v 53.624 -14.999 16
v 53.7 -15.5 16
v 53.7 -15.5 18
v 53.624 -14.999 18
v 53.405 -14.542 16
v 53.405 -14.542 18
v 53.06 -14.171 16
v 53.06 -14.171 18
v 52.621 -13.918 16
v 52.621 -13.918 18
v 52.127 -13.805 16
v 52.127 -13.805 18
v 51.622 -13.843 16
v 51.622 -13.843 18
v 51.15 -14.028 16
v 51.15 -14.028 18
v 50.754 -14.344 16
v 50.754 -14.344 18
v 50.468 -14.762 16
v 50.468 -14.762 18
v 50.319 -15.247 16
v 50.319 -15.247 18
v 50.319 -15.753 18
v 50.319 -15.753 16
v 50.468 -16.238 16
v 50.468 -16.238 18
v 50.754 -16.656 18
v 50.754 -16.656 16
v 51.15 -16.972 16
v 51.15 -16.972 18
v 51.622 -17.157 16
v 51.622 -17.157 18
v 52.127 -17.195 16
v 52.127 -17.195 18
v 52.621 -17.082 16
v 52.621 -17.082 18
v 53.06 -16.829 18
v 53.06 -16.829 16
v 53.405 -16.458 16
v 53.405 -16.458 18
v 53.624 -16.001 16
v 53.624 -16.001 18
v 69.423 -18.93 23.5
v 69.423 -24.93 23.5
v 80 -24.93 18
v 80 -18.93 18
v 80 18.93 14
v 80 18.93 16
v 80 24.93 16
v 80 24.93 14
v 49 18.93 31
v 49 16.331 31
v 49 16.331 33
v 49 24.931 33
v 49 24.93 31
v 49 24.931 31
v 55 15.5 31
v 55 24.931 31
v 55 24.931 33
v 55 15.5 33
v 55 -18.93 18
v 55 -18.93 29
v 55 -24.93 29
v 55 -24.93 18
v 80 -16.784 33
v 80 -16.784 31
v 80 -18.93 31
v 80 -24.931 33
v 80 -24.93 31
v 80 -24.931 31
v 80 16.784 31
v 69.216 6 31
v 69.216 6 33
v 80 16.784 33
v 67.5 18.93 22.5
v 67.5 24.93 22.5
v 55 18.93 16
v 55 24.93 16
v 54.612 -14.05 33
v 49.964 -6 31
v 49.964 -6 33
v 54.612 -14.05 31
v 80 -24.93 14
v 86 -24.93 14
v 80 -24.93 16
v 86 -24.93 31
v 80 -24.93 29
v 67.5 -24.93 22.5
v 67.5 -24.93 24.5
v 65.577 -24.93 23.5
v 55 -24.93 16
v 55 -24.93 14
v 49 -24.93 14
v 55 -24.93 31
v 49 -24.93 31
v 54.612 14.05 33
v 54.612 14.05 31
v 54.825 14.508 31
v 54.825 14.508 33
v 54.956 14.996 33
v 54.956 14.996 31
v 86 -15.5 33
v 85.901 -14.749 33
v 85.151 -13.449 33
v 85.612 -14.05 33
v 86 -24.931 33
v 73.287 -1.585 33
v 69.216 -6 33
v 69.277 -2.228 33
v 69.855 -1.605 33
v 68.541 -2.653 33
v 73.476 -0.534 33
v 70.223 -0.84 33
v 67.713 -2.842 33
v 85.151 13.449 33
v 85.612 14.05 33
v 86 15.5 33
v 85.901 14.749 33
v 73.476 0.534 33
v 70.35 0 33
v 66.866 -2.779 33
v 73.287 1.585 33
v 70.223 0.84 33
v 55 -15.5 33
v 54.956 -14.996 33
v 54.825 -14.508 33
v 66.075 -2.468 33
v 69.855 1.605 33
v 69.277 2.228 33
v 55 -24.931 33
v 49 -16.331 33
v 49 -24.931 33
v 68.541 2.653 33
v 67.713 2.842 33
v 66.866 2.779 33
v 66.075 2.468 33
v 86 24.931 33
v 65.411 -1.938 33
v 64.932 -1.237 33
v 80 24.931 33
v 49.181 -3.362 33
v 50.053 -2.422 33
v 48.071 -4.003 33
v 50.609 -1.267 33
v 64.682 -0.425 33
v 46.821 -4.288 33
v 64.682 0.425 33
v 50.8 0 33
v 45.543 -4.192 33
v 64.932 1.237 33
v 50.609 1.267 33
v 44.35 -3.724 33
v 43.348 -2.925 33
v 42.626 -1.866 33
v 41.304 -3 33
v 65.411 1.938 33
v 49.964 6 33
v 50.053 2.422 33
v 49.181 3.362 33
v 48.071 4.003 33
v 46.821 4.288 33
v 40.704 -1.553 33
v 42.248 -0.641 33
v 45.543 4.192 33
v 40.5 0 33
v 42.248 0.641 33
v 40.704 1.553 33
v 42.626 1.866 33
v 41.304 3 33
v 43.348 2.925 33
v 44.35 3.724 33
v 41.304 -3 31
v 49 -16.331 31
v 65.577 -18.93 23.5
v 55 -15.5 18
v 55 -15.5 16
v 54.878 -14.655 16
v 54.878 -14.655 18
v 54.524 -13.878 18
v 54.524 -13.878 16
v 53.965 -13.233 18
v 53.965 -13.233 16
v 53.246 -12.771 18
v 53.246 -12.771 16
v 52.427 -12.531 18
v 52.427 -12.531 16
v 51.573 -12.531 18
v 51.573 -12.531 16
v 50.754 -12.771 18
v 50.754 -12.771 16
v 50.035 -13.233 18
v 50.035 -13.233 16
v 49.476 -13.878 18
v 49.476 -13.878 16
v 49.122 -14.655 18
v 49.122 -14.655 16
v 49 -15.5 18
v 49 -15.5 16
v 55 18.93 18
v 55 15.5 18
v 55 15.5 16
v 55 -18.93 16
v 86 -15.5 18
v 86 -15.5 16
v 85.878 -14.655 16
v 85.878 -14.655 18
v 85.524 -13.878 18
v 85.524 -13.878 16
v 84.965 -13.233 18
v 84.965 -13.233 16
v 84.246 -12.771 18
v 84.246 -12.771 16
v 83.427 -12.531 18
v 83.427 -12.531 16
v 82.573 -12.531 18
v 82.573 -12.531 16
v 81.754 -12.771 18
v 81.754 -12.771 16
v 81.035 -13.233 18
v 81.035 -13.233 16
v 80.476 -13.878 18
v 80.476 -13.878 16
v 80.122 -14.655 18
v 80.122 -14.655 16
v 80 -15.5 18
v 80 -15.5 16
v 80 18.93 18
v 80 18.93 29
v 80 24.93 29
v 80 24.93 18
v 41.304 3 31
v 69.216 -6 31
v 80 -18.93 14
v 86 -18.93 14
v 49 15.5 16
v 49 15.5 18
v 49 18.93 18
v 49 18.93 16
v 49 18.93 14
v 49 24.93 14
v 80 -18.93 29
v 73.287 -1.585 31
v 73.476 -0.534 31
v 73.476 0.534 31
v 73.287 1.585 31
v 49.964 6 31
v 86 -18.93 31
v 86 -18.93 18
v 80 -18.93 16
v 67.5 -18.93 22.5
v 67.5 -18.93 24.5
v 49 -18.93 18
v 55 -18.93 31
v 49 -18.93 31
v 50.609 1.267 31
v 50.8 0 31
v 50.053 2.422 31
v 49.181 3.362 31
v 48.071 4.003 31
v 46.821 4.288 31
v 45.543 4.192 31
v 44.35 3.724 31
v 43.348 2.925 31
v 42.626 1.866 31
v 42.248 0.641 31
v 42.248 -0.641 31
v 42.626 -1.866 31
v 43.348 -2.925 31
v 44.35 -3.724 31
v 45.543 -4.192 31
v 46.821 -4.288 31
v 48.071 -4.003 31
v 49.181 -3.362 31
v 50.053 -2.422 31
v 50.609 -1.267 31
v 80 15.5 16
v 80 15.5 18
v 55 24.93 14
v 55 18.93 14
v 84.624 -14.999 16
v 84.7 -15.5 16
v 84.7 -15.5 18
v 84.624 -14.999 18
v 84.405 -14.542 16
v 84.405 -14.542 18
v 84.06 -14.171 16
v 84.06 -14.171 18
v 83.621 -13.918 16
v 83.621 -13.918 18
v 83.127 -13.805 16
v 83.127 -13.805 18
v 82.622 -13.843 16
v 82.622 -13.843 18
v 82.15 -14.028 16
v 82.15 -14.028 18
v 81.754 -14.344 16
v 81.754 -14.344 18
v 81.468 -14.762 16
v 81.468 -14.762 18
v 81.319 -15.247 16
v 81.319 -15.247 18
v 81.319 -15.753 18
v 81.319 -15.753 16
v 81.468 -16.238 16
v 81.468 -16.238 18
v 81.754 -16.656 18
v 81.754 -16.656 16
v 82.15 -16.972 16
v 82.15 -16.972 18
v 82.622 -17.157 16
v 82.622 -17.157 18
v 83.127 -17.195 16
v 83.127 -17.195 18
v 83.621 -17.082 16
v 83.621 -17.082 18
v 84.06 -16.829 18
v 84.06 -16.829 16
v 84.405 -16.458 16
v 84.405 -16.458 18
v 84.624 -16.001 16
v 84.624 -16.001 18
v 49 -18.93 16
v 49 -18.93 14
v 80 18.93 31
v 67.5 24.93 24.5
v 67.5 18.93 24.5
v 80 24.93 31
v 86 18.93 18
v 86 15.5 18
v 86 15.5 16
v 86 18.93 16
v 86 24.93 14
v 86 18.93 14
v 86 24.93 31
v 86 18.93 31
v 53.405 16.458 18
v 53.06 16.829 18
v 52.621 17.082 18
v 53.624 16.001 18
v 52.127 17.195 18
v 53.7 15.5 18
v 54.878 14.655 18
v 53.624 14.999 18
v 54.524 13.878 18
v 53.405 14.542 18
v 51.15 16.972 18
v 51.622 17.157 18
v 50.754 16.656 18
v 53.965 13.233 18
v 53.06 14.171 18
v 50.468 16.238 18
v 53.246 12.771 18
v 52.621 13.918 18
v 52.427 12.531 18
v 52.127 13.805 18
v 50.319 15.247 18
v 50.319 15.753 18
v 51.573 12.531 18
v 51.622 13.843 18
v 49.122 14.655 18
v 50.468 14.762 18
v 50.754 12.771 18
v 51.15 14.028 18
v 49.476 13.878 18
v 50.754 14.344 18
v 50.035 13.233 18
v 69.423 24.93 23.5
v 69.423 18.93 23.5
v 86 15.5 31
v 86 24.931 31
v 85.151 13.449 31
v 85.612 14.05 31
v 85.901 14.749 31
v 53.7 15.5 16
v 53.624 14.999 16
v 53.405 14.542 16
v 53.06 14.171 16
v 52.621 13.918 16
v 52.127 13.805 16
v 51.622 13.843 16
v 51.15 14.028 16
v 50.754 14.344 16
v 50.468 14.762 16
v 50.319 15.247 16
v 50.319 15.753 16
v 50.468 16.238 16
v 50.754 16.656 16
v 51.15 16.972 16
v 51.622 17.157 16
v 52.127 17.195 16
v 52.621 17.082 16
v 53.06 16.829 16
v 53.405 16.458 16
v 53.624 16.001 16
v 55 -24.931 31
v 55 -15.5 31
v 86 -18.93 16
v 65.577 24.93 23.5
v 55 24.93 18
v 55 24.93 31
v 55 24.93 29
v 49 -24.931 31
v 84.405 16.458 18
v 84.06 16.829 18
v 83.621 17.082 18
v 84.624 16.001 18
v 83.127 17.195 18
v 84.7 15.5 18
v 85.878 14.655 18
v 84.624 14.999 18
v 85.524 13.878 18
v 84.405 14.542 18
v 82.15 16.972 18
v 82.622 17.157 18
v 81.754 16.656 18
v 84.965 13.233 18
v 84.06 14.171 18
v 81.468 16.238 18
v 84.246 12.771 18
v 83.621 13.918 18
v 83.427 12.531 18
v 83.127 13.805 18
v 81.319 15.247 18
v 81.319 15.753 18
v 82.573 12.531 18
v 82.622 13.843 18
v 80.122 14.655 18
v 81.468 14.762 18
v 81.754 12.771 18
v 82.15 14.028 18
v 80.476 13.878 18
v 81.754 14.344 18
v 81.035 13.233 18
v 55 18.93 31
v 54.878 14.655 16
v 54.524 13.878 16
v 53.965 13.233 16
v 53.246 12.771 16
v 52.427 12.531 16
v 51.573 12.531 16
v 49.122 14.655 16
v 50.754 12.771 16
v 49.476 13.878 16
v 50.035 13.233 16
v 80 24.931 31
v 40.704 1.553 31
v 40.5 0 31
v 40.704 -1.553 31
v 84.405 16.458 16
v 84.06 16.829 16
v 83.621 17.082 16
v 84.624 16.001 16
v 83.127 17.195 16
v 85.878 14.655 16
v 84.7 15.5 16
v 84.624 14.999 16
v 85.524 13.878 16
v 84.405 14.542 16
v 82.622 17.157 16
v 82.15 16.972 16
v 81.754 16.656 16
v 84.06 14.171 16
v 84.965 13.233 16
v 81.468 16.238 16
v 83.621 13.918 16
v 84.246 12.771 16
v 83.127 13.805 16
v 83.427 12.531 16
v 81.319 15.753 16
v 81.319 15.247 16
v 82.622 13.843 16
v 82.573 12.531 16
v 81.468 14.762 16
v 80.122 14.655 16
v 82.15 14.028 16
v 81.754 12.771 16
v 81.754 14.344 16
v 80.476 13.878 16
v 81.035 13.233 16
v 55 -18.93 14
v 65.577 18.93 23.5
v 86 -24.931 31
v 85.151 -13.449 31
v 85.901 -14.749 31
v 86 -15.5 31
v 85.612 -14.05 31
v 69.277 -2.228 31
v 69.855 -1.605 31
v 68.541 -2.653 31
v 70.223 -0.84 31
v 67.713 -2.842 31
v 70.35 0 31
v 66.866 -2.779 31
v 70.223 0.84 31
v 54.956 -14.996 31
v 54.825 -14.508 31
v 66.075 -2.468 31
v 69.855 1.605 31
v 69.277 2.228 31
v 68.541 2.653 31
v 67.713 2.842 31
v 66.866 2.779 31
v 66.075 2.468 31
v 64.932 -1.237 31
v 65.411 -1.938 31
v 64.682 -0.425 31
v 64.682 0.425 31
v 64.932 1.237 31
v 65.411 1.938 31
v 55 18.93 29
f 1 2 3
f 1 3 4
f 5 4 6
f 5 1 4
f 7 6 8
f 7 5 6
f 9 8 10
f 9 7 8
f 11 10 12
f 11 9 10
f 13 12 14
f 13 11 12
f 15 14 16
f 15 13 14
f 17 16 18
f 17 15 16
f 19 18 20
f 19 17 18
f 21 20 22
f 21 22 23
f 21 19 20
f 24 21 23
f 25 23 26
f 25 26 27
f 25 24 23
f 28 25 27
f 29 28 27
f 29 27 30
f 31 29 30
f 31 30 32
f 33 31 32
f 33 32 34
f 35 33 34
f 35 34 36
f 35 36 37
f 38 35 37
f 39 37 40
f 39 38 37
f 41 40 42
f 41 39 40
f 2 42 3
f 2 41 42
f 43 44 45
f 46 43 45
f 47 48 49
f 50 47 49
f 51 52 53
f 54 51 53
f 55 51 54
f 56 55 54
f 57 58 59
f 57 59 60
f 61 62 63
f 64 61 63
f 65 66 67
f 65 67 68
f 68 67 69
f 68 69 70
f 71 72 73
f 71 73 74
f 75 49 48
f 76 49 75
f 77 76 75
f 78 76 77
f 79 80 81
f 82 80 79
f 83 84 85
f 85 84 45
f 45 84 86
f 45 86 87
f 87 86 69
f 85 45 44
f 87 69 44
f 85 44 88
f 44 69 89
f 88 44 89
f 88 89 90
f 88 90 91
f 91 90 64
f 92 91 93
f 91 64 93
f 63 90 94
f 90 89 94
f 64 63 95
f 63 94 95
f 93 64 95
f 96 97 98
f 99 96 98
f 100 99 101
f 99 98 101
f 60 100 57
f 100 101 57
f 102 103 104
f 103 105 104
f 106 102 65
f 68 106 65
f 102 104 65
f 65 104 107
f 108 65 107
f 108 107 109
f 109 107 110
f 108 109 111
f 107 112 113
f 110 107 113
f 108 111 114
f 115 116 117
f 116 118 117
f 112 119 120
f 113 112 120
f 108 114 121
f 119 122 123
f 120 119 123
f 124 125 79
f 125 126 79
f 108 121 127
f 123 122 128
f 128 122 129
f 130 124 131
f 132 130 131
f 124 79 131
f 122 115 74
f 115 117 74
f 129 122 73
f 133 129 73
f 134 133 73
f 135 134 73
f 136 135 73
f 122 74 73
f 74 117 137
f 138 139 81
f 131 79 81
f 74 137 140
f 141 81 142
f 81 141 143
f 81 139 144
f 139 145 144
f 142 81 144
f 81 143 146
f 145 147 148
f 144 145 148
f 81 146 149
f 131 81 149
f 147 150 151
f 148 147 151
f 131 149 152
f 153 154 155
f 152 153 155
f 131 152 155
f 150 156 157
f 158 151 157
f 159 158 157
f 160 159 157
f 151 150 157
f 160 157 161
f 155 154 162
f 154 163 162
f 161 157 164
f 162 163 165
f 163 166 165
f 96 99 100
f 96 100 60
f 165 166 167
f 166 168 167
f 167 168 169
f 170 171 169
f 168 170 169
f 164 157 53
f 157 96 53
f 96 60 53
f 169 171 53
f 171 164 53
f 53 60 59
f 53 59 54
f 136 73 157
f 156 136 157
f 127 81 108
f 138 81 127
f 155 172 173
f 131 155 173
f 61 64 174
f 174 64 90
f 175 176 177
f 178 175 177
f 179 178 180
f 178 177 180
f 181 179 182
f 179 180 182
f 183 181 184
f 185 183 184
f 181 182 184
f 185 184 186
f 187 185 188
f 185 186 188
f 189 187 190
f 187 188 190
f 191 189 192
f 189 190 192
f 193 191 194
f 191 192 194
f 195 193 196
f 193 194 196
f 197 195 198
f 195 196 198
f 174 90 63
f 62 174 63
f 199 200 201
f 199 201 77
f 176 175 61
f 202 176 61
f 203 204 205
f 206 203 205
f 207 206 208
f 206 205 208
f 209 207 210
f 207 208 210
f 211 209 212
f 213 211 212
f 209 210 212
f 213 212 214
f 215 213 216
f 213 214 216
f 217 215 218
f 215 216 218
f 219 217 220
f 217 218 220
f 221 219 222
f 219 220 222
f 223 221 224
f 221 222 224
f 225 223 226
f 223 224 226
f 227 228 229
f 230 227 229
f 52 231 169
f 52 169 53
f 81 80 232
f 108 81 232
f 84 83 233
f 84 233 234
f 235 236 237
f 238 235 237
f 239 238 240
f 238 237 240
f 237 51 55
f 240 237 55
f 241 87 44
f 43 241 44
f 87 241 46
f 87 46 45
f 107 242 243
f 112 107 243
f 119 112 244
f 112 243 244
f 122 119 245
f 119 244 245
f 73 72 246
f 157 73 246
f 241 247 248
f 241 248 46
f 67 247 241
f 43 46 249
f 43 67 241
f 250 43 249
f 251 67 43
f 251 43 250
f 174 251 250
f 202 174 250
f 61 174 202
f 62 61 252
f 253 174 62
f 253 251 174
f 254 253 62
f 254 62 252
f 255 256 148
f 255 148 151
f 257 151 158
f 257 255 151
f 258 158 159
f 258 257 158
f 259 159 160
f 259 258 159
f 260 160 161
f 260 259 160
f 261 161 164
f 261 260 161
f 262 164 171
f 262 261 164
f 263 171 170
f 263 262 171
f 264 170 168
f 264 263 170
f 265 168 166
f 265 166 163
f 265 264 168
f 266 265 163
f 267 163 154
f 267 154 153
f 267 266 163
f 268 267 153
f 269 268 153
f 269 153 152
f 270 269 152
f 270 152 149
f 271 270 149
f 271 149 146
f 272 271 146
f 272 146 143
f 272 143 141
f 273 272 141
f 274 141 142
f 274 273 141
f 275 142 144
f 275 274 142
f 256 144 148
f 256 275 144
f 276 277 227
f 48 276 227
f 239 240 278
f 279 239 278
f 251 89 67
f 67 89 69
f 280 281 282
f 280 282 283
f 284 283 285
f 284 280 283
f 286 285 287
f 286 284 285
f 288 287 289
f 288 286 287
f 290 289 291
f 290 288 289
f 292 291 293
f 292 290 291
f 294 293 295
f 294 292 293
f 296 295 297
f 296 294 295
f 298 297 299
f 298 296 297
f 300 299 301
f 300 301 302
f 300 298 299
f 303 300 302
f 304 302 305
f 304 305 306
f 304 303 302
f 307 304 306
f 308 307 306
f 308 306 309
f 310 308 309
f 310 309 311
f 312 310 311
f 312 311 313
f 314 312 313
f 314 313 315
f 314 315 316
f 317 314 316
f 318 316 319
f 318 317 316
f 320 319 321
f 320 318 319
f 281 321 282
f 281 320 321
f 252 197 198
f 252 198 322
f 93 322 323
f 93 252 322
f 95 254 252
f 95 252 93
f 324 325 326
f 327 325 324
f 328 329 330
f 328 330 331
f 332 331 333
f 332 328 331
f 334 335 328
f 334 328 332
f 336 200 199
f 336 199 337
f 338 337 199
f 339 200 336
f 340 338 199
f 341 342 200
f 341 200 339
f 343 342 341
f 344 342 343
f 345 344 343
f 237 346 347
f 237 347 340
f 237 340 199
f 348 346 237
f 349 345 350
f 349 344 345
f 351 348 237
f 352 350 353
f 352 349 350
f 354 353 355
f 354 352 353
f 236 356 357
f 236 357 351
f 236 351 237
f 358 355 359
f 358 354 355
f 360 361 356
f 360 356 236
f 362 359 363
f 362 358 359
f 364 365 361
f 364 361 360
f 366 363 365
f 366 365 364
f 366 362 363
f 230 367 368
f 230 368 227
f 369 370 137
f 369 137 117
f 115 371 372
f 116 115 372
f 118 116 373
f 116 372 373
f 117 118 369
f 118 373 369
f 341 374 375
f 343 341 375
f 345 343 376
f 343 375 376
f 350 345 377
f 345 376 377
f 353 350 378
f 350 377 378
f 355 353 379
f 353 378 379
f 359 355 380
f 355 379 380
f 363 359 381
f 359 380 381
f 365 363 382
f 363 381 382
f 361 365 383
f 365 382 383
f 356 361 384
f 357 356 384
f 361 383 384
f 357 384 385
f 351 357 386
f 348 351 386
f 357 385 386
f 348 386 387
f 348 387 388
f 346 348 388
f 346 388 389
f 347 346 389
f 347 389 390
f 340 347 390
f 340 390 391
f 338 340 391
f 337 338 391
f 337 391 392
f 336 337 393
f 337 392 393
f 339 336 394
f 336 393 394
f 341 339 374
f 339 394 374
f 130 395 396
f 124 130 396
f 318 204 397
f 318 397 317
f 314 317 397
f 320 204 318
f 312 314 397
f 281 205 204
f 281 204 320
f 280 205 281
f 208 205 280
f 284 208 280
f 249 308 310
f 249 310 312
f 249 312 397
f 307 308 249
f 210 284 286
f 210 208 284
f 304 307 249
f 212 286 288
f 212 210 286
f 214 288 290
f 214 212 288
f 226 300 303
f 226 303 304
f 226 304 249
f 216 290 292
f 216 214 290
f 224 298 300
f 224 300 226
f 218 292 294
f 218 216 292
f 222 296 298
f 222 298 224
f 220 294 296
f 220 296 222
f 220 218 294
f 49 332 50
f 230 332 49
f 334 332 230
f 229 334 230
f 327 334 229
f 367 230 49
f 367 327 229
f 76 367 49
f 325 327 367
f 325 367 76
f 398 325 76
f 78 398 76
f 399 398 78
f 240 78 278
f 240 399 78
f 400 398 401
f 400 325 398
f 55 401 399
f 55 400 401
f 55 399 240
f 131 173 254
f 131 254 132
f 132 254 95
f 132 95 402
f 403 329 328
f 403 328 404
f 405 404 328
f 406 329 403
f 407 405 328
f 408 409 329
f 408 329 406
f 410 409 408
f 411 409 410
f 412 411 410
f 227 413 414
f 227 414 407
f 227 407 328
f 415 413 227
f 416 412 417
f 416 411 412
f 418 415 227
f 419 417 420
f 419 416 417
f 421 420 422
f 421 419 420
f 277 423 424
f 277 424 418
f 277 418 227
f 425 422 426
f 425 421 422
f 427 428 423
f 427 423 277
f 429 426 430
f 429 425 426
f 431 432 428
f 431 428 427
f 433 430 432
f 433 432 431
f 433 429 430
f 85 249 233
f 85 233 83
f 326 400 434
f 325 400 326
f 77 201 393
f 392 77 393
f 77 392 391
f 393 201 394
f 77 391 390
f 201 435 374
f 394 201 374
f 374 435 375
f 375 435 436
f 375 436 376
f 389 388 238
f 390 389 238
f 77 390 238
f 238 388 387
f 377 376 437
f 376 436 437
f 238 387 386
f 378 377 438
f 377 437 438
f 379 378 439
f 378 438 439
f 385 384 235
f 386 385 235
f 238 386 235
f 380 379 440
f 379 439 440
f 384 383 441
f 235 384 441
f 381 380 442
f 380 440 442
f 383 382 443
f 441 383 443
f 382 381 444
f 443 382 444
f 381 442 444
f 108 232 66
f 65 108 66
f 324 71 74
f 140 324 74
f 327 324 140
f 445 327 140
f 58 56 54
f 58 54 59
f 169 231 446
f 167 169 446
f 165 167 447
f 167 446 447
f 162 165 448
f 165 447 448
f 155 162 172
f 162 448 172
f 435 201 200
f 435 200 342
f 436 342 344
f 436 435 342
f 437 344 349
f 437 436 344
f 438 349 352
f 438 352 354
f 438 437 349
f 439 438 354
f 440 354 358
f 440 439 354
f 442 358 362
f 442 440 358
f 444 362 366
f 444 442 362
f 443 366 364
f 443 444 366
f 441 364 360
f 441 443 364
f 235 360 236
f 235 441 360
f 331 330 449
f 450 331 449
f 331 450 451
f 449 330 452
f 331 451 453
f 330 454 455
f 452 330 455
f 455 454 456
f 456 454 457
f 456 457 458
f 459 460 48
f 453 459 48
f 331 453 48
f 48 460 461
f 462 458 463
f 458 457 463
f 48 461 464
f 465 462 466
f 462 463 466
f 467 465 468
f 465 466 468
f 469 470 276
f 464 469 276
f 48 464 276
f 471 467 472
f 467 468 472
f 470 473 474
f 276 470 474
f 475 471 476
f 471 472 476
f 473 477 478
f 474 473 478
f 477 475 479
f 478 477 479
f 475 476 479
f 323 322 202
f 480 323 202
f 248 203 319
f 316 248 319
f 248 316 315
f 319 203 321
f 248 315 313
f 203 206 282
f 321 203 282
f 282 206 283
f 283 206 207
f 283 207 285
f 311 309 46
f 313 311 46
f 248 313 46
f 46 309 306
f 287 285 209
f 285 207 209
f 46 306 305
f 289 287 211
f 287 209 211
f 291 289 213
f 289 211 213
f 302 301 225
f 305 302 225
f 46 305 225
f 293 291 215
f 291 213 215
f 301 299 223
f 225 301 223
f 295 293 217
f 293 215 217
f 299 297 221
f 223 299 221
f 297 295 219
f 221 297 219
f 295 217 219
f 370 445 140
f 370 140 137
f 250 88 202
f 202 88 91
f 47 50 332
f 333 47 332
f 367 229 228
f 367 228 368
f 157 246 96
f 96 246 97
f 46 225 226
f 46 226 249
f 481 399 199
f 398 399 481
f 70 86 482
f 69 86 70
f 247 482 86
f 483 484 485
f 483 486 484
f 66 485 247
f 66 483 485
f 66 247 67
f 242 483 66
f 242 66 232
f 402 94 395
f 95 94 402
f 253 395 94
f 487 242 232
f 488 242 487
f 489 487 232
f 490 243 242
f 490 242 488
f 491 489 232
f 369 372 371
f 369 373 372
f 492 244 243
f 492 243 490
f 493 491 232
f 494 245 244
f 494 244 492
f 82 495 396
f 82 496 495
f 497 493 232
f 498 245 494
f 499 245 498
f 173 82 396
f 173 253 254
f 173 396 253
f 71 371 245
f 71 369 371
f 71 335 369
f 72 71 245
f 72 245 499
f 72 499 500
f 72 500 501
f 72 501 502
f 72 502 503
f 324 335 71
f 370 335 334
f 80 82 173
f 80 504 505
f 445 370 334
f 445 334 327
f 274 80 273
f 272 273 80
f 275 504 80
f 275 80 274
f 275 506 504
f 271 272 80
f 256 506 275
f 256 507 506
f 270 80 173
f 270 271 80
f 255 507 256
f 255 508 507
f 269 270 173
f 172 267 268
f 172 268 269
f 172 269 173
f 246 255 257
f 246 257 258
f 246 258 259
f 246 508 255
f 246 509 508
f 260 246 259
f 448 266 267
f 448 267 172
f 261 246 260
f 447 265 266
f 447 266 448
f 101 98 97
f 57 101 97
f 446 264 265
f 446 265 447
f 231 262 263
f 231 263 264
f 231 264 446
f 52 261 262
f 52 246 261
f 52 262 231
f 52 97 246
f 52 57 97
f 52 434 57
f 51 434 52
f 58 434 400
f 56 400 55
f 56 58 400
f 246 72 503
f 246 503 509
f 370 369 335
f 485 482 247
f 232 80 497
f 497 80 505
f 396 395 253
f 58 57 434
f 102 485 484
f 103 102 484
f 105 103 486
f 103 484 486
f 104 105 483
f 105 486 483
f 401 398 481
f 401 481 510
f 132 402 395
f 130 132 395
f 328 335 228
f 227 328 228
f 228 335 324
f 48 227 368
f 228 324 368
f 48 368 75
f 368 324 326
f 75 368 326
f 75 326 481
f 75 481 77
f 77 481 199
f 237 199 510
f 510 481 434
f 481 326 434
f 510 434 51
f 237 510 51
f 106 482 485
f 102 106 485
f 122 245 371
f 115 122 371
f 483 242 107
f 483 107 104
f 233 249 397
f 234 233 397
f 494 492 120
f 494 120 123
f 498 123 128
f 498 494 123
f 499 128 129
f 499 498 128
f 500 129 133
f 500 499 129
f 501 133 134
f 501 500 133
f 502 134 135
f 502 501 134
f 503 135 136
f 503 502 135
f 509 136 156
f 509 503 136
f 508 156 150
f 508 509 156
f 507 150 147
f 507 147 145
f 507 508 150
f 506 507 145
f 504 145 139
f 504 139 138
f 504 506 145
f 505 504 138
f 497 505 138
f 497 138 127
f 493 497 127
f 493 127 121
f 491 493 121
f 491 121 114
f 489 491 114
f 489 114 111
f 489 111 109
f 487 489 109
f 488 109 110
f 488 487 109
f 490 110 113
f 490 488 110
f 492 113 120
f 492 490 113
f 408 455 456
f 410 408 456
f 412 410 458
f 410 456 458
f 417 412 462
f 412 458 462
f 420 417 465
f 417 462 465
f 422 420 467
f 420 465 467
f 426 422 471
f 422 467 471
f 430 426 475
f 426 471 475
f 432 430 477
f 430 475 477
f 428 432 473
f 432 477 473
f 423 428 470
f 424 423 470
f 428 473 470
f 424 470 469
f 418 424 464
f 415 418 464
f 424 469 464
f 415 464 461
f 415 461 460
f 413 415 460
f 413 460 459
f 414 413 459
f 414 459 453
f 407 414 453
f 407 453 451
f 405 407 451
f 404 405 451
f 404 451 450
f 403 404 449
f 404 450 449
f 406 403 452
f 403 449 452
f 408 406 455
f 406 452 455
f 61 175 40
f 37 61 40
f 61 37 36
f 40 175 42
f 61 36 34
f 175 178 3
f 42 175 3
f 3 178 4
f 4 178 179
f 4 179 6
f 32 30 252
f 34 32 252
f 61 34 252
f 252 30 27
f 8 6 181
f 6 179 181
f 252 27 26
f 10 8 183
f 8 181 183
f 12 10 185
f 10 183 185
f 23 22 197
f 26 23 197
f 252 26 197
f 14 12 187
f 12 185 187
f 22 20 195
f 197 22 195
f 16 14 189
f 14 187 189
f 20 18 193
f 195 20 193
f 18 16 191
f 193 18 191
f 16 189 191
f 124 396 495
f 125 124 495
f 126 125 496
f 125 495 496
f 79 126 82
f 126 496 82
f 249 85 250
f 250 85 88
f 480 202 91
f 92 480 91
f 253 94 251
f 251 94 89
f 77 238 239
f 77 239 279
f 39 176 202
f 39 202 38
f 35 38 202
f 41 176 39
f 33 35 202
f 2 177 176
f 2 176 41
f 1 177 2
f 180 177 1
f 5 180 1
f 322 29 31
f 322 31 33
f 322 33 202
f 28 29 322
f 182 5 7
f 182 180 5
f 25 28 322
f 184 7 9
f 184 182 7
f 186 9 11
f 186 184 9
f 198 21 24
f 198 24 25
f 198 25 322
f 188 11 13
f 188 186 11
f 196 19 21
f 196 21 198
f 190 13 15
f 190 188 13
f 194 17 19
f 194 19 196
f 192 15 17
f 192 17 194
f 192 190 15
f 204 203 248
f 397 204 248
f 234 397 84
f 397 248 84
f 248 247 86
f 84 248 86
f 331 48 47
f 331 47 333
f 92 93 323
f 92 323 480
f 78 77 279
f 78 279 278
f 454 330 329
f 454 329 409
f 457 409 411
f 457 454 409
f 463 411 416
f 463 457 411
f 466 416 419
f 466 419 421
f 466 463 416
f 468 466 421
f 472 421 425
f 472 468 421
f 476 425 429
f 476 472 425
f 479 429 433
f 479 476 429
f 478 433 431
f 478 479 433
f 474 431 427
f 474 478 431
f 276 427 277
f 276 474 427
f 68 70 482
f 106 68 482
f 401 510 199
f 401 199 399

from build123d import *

# Parameters (mm, degrees)
SKETCH105_R                     = 4.3
SKETCH105_R_2                   = 2.85
PAD057_DEPTH                    = 2
SKETCH106_W                     = 6
SKETCH106_H                     = 6
PAD058_DEPTH                    = 17
SKETCH107_R                     = 1.7
PAD059_DEPTH                    = 2
SKETCH107_LINEARPATTERN002_2_R  = 1.7
PAD059_LINEARPATTERN002_2_DEPTH = 2
SKETCH106_LINEARPATTERN002_2_W  = 6
SKETCH106_LINEARPATTERN002_2_H  = 6
PAD058_LINEARPATTERN002_2_DEPTH = 17
PAD060_DEPTH                    = 6


with BuildPart() as part:
    # Sketch105 → Pad057 (new body)
    with BuildSketch(Plane.XY):
        with BuildLine():
            Line((3.464102, 6), (21, 6))
            Line((22.716302, 6), (21, 6))
            Line((22.716302, 6), (33.500258, 16.783955))
            Line((33.500258, 16.783955), (33.500258, 24.930573))
            Line((33.500258, 24.930573), (39.500258, 24.930573))
            Line((39.500258, 24.930573), (39.500258, 15.5))
            ThreePointArc((38.650792, 13.449208), (39.279489, 14.390119), (39.500258, 15.5))
            Line((26.786802, 1.585219), (38.650792, 13.449208))
            ThreePointArc((26.786802, -1.585219), (27, 0), (26.786802, 1.585219))
            Line((26.786802, -1.585219), (38.650792, -13.449208))
            ThreePointArc((39.500258, -15.5), (39.279489, -14.390119), (38.650792, -13.449208))
            Line((39.500258, -24.930573), (39.500258, -15.5))
            Line((33.500258, -24.930573), (39.500258, -24.930573))
            Line((33.500258, -16.783955), (33.500258, -24.930573))
            Line((22.716302, -6), (33.500258, -16.783955))
            Line((21, -6), (22.716302, -6))
            Line((3.464102, -6), (21, -6))
            Line((3.464102, -6), (8.111697, -14.049871))
            ThreePointArc((8.500258, -15.5), (8.401434, -14.749358), (8.111697, -14.049871))
            Line((8.500258, -24.930573), (8.500258, -15.5))
            Line((2.500258, -24.930573), (8.500258, -24.930573))
            Line((2.500258, -16.330573), (2.500258, -24.930573))
            Line((-5.196152, -3), (2.500258, -16.330573))
            ThreePointArc((-5.196152, 3), (-6, 0), (-5.196152, -3))
            Line((-5.196152, 3), (2.500258, 16.330573))
            Line((2.500258, 16.330573), (2.500258, 24.930573))
            Line((2.500258, 24.930573), (8.500258, 24.930573))
            Line((8.500258, 24.930573), (8.500258, 15.5))
            ThreePointArc((8.111697, 14.049871), (8.401434, 14.749358), (8.500258, 15.5))
            Line((3.464102, 6), (8.111697, 14.049871))
        make_face()
        Circle(SKETCH105_R, mode=Mode.SUBTRACT)
        with Locations((21, 0)):
            Circle(SKETCH105_R_2, mode=Mode.SUBTRACT)
    extrude(amount=PAD057_DEPTH)

    # Sketch106 (on Face33 of Pad057) → Pad058 (join)
    with BuildSketch(Plane(origin=(0, 0, 0), x_dir=(1, 0, 0), z_dir=(0, 0, -1))):
        with Locations((5.5, 21.93)):
            Rectangle(SKETCH106_W, SKETCH106_H)
    pad058 = extrude(amount=PAD058_DEPTH)

    # Sketch107 → Pad059 (join)
    with BuildSketch(Plane.XY.offset(-15)):
        with BuildLine():
            Line((2.5, -18.93), (2.5, -15.5))
            ThreePointArc((8.5, -15.5), (5.5, -12.5), (2.5, -15.5))
            Line((8.5, -18.93), (8.5, -15.5))
            Line((2.5, -18.93), (8.5, -18.93))
        make_face()
        with Locations((5.5, -15.5)):
            Circle(SKETCH107_R, mode=Mode.SUBTRACT)
    pad059 = extrude(amount=PAD059_DEPTH)

    # Sketch107 LinearPattern002 2 → Pad059 LinearPattern002 2 (add)
    with BuildSketch(Plane(origin=(31, 0, -15), x_dir=(1, 0, 0), z_dir=(0, 0, 1))):
        with BuildLine():
            Line((2.5, -18.93), (2.5, -15.5))
            ThreePointArc((8.5, -15.5), (5.5, -12.5), (2.5, -15.5))
            Line((8.5, -18.93), (8.5, -15.5))
            Line((2.5, -18.93), (8.5, -18.93))
        make_face()
        with Locations((5.5, -15.5)):
            Circle(SKETCH107_LINEARPATTERN002_2_R, mode=Mode.SUBTRACT)
    pad059_linearpattern002_2 = extrude(amount=PAD059_LINEARPATTERN002_2_DEPTH)

    # Sketch106 LinearPattern002 2 → Pad058 LinearPattern002 2 (add)
    with BuildSketch(Plane(origin=(31, 0, 0), x_dir=(1, 0, 0), z_dir=(0, 0, -1))):
        with Locations((5.5, 21.93)):
            Rectangle(SKETCH106_LINEARPATTERN002_2_W, SKETCH106_LINEARPATTERN002_2_H)
    pad058_linearpattern002_2 = extrude(amount=PAD058_LINEARPATTERN002_2_DEPTH)

    # Mirrored003: Pad059, Pad058, Pad059 LinearPattern002 2, Pad058 LinearPattern002 2 across Sketch107 H_Axis
    add(pad059.mirror(Plane(origin=(0, 0, -15), x_dir=(0, 0, 1), z_dir=(0, 1, 0))))
    add(pad058.mirror(Plane(origin=(0, 0, -15), x_dir=(0, 0, 1), z_dir=(0, 1, 0))))
    add(pad059_linearpattern002_2.mirror(Plane(origin=(0, 0, -15), x_dir=(0, 0, 1), z_dir=(0, 1, 0))))
    add(pad058_linearpattern002_2.mirror(Plane(origin=(0, 0, -15), x_dir=(0, 0, 1), z_dir=(0, 1, 0))))

    # Sketch108 (on Face36 of MultiTransform003) → Pad060 (join)
    with BuildSketch(Plane.XZ.offset(24.93)):
        Polygon((8.5, 0), (21, -6.5), (33.5, 0), (33.5, -2), (22.923077, -7.5), (33.5, -13), (33.5, -15), (21, -8.5), (8.5, -15), (8.5, -13), (19.076923, -7.5), (8.5, -2), align=None)
    pad060 = extrude(amount=-PAD060_DEPTH)

    # Mirrored004: Pad060 across XZ
    add(pad060.mirror(Plane.XZ))


with BuildPart() as part_1:
    # Body028 placement: moved
    add(part.part.moved(Location((46.5, 0, 31))))


solid = part_1.part
